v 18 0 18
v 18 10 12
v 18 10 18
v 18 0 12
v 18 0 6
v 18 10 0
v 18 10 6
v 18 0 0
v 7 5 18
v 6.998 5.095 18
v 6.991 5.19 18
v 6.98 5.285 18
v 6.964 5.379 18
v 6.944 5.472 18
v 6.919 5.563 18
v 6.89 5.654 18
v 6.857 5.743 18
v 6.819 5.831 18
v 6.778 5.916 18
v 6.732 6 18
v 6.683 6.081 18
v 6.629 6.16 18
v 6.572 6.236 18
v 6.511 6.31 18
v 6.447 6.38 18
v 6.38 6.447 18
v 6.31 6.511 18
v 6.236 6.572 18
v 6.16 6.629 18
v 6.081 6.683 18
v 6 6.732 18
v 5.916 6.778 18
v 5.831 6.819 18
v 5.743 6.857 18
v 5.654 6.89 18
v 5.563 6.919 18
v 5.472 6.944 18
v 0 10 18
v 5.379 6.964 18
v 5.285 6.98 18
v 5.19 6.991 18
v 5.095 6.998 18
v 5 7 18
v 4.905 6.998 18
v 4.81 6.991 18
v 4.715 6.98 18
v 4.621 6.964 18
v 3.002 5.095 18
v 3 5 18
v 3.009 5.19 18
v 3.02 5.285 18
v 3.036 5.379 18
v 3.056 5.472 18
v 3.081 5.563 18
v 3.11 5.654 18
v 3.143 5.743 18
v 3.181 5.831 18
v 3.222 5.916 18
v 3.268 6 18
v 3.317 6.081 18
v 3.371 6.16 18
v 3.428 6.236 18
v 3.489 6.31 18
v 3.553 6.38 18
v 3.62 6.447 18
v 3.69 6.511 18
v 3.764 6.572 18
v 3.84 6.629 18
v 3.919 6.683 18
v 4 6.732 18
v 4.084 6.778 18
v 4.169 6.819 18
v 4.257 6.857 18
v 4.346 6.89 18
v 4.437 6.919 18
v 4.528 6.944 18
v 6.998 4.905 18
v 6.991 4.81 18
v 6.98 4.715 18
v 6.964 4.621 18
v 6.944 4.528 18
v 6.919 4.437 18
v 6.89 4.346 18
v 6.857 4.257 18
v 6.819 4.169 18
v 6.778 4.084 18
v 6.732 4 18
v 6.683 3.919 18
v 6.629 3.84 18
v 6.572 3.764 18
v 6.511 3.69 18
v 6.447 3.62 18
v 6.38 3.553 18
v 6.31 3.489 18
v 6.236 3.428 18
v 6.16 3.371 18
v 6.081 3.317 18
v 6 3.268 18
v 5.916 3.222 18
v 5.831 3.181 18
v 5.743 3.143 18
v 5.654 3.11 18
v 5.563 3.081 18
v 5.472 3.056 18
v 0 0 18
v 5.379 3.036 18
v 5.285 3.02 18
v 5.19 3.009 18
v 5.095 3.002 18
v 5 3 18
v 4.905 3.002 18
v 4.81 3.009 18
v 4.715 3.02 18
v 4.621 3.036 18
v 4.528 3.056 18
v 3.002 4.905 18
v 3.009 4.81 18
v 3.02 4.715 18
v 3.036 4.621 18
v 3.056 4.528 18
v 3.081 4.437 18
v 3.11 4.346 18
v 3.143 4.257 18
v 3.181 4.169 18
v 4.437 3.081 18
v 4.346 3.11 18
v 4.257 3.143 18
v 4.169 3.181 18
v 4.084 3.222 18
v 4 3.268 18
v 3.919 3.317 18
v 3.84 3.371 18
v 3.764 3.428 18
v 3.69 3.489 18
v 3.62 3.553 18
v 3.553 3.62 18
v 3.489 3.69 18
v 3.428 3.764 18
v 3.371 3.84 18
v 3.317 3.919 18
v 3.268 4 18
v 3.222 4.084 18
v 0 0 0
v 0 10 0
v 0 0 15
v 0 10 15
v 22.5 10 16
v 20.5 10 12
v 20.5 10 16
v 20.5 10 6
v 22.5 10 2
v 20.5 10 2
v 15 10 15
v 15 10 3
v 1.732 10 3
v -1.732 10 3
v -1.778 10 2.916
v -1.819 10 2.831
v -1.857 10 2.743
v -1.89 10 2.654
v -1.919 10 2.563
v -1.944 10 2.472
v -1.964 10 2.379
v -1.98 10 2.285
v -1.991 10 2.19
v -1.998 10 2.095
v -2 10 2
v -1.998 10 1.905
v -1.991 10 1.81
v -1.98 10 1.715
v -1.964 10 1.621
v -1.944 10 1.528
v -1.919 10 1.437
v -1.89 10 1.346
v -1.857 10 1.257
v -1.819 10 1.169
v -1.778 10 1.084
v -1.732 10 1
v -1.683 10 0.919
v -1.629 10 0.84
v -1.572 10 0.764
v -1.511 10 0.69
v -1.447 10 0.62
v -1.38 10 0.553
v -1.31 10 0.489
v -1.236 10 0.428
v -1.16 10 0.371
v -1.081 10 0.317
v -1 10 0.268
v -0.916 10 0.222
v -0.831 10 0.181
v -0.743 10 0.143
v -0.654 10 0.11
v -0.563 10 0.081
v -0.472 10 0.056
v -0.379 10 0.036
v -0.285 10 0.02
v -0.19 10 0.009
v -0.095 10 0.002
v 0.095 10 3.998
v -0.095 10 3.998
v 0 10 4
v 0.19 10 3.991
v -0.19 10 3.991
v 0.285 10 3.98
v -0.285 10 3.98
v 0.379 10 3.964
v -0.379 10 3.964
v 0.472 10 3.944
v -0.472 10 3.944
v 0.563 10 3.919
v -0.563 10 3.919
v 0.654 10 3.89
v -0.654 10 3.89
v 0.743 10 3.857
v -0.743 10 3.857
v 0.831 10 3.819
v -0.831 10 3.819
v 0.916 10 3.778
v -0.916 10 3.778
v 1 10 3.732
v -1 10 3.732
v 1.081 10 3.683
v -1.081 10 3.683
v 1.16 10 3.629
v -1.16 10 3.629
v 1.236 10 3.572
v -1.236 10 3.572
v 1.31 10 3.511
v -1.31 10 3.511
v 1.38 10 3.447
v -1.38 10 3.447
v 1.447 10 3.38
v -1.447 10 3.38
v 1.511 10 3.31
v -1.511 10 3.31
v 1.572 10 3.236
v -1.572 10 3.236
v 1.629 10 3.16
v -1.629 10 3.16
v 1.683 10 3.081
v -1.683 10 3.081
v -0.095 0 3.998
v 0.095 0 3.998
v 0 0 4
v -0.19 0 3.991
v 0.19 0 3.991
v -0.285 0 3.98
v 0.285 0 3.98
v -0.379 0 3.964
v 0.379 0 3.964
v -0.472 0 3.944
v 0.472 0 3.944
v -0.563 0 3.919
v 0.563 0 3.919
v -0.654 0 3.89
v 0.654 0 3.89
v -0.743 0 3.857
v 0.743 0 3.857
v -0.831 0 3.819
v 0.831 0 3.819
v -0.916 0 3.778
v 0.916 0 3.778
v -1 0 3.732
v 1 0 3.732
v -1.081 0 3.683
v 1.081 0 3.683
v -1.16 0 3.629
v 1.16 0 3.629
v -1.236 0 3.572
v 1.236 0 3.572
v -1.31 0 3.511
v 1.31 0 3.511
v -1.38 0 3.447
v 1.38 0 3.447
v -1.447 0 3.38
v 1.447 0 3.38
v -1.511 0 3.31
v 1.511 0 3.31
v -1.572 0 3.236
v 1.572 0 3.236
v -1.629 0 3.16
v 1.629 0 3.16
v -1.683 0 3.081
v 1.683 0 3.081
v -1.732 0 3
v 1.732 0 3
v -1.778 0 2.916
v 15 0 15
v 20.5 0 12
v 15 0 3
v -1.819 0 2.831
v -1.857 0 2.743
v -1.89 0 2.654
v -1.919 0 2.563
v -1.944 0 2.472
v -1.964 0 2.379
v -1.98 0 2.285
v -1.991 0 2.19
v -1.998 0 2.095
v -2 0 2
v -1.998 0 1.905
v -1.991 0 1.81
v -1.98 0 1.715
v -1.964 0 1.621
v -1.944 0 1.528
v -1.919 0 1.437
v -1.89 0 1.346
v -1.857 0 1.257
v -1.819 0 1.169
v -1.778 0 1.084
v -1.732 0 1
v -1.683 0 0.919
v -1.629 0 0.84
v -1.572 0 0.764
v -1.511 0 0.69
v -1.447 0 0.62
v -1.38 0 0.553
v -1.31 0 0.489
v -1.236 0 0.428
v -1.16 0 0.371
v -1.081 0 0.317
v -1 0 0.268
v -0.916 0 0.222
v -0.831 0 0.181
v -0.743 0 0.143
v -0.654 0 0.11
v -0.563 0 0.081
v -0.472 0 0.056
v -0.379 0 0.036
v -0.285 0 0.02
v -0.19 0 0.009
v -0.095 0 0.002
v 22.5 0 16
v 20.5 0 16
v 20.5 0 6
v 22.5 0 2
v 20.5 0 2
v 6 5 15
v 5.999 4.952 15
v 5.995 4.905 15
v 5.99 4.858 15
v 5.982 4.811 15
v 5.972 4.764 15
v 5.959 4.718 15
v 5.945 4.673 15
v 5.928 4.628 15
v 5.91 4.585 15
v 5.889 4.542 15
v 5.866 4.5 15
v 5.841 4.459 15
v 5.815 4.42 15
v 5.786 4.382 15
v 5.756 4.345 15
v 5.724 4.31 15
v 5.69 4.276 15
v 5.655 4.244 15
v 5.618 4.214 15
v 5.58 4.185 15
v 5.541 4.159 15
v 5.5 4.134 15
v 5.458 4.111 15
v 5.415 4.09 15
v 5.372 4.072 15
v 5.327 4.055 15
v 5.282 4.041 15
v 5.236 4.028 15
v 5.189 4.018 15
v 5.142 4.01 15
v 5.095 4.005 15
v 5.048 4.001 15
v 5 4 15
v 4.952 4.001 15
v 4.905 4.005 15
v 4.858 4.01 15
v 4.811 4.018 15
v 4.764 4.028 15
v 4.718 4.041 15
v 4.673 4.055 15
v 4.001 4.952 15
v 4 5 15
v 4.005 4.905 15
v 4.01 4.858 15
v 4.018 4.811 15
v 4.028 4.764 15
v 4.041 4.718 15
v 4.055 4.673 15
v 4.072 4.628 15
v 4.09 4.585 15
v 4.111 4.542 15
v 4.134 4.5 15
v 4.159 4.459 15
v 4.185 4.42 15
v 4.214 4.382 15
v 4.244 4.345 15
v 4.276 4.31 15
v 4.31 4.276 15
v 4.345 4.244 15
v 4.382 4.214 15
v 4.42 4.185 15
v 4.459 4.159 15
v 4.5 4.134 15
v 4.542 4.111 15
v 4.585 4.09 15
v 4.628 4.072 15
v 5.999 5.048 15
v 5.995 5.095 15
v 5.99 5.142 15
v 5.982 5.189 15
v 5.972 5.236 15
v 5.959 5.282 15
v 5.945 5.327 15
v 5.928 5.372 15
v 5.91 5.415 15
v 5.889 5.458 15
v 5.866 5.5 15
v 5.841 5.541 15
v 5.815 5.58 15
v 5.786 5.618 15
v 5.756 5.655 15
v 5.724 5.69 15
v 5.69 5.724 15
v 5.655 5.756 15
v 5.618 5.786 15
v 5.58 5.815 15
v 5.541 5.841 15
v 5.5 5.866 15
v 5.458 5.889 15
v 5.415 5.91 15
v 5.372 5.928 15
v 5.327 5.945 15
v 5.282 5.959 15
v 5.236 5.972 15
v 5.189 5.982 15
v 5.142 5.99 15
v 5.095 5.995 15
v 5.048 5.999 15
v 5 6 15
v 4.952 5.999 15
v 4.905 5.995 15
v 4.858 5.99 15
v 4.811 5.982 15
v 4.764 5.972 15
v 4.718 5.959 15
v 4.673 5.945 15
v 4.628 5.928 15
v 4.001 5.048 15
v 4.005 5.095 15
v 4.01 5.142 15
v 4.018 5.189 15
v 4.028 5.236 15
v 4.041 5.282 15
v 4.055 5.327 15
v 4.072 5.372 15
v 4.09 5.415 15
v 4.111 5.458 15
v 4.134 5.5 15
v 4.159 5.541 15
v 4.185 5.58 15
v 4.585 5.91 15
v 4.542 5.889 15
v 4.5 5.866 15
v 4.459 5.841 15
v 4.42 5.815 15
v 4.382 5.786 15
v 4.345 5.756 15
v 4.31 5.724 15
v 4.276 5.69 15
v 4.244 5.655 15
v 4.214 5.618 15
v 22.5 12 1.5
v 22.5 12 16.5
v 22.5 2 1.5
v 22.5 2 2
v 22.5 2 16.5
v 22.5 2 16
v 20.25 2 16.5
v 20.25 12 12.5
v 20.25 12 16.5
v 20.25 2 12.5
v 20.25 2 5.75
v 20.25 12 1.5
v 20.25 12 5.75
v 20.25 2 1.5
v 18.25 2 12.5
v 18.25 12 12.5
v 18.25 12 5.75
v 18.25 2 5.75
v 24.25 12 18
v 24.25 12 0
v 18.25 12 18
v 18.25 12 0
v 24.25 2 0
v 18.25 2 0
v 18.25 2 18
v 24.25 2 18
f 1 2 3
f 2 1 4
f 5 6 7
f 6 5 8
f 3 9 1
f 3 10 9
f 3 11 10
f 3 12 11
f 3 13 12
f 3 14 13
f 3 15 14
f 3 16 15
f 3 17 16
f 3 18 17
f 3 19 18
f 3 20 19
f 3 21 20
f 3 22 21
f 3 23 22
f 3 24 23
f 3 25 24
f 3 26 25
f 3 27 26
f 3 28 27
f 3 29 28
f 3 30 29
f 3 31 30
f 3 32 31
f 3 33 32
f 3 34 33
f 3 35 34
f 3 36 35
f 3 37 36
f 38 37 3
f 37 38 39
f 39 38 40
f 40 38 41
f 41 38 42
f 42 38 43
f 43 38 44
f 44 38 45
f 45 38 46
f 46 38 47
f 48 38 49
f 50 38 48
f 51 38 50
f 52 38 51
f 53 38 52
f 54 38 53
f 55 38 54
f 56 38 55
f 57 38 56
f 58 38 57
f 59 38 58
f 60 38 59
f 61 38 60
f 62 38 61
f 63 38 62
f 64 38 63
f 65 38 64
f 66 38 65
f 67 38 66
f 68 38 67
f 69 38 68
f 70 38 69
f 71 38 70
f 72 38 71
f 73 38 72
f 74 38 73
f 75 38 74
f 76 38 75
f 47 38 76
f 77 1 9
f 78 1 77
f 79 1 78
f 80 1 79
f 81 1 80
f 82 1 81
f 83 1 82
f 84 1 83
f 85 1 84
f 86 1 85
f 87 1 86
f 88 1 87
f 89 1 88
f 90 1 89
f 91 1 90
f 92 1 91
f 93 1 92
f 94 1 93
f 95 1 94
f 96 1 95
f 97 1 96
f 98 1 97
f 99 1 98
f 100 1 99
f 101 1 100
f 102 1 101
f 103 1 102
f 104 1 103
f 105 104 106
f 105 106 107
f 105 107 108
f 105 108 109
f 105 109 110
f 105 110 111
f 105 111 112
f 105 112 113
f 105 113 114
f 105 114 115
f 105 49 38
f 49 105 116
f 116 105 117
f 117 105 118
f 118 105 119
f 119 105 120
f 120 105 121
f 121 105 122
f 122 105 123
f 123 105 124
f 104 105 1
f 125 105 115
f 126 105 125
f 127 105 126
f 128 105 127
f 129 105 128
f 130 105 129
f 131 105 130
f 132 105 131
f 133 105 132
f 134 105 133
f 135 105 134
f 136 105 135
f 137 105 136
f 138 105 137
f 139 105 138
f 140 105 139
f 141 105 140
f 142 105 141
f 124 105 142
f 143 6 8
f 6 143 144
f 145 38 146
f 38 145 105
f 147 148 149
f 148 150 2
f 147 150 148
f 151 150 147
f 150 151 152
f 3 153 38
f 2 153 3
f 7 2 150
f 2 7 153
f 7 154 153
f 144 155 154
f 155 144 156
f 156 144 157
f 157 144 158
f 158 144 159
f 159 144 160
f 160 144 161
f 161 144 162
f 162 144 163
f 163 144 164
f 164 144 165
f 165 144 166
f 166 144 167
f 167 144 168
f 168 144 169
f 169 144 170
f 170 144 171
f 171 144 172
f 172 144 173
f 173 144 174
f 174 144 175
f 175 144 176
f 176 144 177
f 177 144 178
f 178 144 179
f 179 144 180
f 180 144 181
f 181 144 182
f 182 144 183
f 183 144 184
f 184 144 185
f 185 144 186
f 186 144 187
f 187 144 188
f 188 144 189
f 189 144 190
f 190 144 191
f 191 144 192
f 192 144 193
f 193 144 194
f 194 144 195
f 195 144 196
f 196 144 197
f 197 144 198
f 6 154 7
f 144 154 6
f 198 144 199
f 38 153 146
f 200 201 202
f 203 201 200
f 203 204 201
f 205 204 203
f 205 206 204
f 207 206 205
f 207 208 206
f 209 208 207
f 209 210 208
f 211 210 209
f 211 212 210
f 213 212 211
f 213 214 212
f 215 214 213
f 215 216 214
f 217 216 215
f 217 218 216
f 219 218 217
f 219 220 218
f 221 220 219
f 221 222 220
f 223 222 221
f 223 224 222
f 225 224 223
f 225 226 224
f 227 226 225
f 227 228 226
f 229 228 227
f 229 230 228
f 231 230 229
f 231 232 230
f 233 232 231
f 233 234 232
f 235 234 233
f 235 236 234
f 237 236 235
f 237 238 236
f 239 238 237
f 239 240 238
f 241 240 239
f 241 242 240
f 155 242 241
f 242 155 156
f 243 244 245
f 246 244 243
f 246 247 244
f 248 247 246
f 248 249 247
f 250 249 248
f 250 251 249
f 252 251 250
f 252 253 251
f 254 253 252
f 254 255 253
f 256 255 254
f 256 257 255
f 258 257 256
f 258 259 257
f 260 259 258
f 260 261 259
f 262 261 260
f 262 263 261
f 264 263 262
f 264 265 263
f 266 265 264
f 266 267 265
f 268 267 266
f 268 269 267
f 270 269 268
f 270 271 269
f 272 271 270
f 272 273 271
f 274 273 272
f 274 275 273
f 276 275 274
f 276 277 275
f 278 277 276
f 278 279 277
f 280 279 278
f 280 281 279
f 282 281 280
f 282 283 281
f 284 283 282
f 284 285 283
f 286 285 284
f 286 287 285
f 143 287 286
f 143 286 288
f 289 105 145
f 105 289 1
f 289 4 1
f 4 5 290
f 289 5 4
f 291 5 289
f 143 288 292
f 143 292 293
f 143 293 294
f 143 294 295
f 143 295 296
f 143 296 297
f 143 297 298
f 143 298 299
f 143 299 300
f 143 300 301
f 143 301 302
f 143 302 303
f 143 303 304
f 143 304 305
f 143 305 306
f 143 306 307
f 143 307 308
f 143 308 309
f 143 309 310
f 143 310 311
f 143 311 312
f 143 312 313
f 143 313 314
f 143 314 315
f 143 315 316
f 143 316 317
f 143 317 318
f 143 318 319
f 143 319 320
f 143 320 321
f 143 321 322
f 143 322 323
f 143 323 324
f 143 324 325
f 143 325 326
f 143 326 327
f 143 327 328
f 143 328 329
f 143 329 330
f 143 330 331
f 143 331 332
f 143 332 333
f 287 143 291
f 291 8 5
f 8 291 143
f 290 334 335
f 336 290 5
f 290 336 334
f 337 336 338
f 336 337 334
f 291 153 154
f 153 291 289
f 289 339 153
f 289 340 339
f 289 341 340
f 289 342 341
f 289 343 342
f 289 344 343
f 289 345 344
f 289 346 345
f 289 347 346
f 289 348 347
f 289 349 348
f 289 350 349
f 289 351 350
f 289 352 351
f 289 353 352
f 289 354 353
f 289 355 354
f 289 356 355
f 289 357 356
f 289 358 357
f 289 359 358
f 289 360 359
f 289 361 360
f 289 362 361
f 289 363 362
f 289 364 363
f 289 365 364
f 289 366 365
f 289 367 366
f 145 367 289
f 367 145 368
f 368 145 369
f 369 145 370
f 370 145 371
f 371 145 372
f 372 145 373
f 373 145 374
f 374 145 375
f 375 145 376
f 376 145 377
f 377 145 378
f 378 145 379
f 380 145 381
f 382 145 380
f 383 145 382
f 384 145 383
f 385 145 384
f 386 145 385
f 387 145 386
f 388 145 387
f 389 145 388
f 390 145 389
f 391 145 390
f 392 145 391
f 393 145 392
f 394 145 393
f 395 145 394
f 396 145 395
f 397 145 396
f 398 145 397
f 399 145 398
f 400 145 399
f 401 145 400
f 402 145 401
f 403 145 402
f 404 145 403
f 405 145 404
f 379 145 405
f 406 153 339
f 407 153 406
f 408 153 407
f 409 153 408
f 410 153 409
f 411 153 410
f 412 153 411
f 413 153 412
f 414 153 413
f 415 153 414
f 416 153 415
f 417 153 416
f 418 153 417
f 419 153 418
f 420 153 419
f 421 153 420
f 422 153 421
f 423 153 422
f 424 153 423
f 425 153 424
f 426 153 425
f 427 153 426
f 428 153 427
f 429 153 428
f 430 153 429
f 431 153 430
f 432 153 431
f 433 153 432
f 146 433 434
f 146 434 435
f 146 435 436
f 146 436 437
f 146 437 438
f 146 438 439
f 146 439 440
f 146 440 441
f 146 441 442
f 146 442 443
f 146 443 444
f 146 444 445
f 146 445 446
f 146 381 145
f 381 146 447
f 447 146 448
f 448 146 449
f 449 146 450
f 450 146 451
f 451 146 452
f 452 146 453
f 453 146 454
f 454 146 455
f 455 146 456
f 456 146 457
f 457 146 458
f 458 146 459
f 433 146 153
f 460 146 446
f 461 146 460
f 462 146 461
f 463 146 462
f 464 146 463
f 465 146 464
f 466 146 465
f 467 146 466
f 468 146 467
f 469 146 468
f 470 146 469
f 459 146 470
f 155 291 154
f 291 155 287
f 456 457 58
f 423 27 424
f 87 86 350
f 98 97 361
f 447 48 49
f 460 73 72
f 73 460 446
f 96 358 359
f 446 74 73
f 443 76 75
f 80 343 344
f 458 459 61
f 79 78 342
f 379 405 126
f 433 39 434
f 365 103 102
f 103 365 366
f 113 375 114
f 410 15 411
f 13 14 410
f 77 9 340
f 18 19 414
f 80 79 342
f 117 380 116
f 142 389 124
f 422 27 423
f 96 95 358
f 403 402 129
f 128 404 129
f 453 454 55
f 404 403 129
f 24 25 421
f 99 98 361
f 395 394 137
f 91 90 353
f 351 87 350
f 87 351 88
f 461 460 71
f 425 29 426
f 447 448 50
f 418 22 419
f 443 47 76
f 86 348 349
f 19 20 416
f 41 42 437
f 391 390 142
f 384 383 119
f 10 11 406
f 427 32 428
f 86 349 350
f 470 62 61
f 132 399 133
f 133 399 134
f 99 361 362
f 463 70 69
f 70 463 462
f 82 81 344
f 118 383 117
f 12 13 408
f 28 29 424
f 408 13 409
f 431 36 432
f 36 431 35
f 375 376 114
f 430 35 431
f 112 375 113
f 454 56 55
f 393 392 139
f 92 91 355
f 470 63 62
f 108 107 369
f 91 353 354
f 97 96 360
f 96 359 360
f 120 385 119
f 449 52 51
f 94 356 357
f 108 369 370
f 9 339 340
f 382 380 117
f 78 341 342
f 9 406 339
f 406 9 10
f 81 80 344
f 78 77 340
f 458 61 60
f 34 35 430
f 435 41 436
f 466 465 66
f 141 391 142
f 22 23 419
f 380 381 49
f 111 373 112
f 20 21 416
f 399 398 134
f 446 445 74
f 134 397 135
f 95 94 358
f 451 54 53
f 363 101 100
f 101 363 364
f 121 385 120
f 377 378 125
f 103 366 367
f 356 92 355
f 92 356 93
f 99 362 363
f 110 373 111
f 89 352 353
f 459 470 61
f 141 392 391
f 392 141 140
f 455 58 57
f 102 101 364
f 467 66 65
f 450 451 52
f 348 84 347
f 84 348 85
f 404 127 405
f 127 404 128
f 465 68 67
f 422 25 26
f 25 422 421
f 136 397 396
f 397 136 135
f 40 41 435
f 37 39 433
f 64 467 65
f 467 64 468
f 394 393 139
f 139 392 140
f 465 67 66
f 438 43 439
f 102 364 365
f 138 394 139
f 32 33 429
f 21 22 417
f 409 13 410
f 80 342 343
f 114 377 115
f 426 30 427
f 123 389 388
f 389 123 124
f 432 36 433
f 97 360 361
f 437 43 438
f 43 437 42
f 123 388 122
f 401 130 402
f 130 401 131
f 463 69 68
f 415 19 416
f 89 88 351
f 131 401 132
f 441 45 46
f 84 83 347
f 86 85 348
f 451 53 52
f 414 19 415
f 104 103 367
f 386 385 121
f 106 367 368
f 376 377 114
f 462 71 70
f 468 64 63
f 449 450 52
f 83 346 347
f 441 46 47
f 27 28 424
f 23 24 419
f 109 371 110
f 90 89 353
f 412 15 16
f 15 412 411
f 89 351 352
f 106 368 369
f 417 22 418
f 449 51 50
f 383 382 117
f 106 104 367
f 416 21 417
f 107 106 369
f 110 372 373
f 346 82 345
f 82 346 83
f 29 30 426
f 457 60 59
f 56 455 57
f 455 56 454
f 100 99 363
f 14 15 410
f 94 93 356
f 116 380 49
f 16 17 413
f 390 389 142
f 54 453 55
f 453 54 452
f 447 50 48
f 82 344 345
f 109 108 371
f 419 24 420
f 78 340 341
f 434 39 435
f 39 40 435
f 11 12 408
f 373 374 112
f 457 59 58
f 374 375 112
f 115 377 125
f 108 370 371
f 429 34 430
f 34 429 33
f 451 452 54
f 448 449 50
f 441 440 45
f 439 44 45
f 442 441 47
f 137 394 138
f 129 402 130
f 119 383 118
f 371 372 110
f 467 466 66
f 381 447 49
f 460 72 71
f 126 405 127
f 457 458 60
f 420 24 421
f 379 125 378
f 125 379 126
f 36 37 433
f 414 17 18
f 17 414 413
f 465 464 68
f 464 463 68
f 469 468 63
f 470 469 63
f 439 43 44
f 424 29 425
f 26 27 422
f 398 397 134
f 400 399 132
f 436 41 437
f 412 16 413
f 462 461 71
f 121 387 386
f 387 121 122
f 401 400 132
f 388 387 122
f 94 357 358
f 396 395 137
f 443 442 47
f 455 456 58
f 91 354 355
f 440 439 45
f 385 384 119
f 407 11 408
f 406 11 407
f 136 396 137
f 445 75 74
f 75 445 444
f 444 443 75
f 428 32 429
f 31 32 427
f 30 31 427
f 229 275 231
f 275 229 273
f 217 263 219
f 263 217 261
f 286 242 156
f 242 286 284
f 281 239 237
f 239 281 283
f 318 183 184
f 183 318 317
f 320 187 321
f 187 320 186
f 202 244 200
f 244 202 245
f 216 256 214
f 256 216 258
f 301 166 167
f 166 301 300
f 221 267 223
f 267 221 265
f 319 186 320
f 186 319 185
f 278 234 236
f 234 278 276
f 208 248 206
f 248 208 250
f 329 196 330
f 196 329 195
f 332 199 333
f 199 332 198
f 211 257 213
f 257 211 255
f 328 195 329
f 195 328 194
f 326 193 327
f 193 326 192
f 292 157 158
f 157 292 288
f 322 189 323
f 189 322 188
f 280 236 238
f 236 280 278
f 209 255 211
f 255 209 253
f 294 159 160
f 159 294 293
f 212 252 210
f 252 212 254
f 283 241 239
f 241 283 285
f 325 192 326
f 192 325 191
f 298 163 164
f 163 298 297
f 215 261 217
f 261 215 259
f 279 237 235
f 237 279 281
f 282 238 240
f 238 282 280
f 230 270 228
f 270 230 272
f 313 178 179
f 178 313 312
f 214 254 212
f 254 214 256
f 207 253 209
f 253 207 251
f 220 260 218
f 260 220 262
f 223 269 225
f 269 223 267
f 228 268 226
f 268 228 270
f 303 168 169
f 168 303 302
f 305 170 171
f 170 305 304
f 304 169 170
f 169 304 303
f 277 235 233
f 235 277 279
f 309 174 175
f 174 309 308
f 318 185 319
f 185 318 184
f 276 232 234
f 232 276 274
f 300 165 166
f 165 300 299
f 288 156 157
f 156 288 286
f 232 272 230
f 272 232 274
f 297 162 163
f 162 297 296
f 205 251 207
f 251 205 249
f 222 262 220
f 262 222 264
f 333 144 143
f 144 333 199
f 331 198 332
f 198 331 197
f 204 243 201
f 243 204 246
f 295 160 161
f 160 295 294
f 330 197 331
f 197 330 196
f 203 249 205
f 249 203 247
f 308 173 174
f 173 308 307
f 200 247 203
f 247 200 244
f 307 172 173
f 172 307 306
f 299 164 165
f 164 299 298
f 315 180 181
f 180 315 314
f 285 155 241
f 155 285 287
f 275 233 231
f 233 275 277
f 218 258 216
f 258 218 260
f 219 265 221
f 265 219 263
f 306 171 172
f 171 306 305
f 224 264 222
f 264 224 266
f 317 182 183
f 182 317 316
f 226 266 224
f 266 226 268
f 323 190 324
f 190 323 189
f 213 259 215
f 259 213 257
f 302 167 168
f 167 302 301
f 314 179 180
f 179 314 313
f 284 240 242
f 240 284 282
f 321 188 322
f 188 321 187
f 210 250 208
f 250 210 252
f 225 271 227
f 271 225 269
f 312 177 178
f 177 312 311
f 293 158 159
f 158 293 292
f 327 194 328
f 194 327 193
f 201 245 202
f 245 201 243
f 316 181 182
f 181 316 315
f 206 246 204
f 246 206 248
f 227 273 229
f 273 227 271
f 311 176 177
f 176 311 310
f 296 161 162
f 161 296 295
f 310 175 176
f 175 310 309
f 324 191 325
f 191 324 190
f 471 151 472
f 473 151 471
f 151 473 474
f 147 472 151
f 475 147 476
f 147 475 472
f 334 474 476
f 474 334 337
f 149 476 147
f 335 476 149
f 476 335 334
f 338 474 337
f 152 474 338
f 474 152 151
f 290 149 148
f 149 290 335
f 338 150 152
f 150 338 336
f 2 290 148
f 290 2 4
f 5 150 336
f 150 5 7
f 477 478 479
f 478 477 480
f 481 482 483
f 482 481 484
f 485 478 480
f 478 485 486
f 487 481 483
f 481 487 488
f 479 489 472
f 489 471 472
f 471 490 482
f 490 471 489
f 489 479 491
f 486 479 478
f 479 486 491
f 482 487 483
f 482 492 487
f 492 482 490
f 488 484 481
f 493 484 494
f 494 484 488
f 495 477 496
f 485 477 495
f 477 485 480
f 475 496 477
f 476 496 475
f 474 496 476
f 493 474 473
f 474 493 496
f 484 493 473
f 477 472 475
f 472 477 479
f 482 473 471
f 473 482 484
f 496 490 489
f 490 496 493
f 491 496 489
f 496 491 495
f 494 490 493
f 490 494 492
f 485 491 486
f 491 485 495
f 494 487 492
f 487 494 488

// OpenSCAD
$fn=132;
clip();
translate([17.5,2,0]){bracket();}
module clip(){
difference(){
cube([18,10,18]);
translate([0,0,3]){cube([15,10,12]);}  
translate([5,5,15]){cylinder(3,1,2,5);}
}    
rrad = 2;
translate([0,0,rrad]){rotate([-90,0,0]){cylinder(10,rrad,rrad);}}
translate([20.5,0,2]){cube([2,10,14]);}

translate([18,0,6]){cube([2.5,10,6]);}
}


module bracket(){
difference(){
translate([.75,0,0]){cube([6,10,18]);}
union(){
translate([0,0,5.75]){cube([2.75,10,6.75]);}
translate([2.75,0,1.5]){cube([2.25,11.5,15]);}
}


    }
}
